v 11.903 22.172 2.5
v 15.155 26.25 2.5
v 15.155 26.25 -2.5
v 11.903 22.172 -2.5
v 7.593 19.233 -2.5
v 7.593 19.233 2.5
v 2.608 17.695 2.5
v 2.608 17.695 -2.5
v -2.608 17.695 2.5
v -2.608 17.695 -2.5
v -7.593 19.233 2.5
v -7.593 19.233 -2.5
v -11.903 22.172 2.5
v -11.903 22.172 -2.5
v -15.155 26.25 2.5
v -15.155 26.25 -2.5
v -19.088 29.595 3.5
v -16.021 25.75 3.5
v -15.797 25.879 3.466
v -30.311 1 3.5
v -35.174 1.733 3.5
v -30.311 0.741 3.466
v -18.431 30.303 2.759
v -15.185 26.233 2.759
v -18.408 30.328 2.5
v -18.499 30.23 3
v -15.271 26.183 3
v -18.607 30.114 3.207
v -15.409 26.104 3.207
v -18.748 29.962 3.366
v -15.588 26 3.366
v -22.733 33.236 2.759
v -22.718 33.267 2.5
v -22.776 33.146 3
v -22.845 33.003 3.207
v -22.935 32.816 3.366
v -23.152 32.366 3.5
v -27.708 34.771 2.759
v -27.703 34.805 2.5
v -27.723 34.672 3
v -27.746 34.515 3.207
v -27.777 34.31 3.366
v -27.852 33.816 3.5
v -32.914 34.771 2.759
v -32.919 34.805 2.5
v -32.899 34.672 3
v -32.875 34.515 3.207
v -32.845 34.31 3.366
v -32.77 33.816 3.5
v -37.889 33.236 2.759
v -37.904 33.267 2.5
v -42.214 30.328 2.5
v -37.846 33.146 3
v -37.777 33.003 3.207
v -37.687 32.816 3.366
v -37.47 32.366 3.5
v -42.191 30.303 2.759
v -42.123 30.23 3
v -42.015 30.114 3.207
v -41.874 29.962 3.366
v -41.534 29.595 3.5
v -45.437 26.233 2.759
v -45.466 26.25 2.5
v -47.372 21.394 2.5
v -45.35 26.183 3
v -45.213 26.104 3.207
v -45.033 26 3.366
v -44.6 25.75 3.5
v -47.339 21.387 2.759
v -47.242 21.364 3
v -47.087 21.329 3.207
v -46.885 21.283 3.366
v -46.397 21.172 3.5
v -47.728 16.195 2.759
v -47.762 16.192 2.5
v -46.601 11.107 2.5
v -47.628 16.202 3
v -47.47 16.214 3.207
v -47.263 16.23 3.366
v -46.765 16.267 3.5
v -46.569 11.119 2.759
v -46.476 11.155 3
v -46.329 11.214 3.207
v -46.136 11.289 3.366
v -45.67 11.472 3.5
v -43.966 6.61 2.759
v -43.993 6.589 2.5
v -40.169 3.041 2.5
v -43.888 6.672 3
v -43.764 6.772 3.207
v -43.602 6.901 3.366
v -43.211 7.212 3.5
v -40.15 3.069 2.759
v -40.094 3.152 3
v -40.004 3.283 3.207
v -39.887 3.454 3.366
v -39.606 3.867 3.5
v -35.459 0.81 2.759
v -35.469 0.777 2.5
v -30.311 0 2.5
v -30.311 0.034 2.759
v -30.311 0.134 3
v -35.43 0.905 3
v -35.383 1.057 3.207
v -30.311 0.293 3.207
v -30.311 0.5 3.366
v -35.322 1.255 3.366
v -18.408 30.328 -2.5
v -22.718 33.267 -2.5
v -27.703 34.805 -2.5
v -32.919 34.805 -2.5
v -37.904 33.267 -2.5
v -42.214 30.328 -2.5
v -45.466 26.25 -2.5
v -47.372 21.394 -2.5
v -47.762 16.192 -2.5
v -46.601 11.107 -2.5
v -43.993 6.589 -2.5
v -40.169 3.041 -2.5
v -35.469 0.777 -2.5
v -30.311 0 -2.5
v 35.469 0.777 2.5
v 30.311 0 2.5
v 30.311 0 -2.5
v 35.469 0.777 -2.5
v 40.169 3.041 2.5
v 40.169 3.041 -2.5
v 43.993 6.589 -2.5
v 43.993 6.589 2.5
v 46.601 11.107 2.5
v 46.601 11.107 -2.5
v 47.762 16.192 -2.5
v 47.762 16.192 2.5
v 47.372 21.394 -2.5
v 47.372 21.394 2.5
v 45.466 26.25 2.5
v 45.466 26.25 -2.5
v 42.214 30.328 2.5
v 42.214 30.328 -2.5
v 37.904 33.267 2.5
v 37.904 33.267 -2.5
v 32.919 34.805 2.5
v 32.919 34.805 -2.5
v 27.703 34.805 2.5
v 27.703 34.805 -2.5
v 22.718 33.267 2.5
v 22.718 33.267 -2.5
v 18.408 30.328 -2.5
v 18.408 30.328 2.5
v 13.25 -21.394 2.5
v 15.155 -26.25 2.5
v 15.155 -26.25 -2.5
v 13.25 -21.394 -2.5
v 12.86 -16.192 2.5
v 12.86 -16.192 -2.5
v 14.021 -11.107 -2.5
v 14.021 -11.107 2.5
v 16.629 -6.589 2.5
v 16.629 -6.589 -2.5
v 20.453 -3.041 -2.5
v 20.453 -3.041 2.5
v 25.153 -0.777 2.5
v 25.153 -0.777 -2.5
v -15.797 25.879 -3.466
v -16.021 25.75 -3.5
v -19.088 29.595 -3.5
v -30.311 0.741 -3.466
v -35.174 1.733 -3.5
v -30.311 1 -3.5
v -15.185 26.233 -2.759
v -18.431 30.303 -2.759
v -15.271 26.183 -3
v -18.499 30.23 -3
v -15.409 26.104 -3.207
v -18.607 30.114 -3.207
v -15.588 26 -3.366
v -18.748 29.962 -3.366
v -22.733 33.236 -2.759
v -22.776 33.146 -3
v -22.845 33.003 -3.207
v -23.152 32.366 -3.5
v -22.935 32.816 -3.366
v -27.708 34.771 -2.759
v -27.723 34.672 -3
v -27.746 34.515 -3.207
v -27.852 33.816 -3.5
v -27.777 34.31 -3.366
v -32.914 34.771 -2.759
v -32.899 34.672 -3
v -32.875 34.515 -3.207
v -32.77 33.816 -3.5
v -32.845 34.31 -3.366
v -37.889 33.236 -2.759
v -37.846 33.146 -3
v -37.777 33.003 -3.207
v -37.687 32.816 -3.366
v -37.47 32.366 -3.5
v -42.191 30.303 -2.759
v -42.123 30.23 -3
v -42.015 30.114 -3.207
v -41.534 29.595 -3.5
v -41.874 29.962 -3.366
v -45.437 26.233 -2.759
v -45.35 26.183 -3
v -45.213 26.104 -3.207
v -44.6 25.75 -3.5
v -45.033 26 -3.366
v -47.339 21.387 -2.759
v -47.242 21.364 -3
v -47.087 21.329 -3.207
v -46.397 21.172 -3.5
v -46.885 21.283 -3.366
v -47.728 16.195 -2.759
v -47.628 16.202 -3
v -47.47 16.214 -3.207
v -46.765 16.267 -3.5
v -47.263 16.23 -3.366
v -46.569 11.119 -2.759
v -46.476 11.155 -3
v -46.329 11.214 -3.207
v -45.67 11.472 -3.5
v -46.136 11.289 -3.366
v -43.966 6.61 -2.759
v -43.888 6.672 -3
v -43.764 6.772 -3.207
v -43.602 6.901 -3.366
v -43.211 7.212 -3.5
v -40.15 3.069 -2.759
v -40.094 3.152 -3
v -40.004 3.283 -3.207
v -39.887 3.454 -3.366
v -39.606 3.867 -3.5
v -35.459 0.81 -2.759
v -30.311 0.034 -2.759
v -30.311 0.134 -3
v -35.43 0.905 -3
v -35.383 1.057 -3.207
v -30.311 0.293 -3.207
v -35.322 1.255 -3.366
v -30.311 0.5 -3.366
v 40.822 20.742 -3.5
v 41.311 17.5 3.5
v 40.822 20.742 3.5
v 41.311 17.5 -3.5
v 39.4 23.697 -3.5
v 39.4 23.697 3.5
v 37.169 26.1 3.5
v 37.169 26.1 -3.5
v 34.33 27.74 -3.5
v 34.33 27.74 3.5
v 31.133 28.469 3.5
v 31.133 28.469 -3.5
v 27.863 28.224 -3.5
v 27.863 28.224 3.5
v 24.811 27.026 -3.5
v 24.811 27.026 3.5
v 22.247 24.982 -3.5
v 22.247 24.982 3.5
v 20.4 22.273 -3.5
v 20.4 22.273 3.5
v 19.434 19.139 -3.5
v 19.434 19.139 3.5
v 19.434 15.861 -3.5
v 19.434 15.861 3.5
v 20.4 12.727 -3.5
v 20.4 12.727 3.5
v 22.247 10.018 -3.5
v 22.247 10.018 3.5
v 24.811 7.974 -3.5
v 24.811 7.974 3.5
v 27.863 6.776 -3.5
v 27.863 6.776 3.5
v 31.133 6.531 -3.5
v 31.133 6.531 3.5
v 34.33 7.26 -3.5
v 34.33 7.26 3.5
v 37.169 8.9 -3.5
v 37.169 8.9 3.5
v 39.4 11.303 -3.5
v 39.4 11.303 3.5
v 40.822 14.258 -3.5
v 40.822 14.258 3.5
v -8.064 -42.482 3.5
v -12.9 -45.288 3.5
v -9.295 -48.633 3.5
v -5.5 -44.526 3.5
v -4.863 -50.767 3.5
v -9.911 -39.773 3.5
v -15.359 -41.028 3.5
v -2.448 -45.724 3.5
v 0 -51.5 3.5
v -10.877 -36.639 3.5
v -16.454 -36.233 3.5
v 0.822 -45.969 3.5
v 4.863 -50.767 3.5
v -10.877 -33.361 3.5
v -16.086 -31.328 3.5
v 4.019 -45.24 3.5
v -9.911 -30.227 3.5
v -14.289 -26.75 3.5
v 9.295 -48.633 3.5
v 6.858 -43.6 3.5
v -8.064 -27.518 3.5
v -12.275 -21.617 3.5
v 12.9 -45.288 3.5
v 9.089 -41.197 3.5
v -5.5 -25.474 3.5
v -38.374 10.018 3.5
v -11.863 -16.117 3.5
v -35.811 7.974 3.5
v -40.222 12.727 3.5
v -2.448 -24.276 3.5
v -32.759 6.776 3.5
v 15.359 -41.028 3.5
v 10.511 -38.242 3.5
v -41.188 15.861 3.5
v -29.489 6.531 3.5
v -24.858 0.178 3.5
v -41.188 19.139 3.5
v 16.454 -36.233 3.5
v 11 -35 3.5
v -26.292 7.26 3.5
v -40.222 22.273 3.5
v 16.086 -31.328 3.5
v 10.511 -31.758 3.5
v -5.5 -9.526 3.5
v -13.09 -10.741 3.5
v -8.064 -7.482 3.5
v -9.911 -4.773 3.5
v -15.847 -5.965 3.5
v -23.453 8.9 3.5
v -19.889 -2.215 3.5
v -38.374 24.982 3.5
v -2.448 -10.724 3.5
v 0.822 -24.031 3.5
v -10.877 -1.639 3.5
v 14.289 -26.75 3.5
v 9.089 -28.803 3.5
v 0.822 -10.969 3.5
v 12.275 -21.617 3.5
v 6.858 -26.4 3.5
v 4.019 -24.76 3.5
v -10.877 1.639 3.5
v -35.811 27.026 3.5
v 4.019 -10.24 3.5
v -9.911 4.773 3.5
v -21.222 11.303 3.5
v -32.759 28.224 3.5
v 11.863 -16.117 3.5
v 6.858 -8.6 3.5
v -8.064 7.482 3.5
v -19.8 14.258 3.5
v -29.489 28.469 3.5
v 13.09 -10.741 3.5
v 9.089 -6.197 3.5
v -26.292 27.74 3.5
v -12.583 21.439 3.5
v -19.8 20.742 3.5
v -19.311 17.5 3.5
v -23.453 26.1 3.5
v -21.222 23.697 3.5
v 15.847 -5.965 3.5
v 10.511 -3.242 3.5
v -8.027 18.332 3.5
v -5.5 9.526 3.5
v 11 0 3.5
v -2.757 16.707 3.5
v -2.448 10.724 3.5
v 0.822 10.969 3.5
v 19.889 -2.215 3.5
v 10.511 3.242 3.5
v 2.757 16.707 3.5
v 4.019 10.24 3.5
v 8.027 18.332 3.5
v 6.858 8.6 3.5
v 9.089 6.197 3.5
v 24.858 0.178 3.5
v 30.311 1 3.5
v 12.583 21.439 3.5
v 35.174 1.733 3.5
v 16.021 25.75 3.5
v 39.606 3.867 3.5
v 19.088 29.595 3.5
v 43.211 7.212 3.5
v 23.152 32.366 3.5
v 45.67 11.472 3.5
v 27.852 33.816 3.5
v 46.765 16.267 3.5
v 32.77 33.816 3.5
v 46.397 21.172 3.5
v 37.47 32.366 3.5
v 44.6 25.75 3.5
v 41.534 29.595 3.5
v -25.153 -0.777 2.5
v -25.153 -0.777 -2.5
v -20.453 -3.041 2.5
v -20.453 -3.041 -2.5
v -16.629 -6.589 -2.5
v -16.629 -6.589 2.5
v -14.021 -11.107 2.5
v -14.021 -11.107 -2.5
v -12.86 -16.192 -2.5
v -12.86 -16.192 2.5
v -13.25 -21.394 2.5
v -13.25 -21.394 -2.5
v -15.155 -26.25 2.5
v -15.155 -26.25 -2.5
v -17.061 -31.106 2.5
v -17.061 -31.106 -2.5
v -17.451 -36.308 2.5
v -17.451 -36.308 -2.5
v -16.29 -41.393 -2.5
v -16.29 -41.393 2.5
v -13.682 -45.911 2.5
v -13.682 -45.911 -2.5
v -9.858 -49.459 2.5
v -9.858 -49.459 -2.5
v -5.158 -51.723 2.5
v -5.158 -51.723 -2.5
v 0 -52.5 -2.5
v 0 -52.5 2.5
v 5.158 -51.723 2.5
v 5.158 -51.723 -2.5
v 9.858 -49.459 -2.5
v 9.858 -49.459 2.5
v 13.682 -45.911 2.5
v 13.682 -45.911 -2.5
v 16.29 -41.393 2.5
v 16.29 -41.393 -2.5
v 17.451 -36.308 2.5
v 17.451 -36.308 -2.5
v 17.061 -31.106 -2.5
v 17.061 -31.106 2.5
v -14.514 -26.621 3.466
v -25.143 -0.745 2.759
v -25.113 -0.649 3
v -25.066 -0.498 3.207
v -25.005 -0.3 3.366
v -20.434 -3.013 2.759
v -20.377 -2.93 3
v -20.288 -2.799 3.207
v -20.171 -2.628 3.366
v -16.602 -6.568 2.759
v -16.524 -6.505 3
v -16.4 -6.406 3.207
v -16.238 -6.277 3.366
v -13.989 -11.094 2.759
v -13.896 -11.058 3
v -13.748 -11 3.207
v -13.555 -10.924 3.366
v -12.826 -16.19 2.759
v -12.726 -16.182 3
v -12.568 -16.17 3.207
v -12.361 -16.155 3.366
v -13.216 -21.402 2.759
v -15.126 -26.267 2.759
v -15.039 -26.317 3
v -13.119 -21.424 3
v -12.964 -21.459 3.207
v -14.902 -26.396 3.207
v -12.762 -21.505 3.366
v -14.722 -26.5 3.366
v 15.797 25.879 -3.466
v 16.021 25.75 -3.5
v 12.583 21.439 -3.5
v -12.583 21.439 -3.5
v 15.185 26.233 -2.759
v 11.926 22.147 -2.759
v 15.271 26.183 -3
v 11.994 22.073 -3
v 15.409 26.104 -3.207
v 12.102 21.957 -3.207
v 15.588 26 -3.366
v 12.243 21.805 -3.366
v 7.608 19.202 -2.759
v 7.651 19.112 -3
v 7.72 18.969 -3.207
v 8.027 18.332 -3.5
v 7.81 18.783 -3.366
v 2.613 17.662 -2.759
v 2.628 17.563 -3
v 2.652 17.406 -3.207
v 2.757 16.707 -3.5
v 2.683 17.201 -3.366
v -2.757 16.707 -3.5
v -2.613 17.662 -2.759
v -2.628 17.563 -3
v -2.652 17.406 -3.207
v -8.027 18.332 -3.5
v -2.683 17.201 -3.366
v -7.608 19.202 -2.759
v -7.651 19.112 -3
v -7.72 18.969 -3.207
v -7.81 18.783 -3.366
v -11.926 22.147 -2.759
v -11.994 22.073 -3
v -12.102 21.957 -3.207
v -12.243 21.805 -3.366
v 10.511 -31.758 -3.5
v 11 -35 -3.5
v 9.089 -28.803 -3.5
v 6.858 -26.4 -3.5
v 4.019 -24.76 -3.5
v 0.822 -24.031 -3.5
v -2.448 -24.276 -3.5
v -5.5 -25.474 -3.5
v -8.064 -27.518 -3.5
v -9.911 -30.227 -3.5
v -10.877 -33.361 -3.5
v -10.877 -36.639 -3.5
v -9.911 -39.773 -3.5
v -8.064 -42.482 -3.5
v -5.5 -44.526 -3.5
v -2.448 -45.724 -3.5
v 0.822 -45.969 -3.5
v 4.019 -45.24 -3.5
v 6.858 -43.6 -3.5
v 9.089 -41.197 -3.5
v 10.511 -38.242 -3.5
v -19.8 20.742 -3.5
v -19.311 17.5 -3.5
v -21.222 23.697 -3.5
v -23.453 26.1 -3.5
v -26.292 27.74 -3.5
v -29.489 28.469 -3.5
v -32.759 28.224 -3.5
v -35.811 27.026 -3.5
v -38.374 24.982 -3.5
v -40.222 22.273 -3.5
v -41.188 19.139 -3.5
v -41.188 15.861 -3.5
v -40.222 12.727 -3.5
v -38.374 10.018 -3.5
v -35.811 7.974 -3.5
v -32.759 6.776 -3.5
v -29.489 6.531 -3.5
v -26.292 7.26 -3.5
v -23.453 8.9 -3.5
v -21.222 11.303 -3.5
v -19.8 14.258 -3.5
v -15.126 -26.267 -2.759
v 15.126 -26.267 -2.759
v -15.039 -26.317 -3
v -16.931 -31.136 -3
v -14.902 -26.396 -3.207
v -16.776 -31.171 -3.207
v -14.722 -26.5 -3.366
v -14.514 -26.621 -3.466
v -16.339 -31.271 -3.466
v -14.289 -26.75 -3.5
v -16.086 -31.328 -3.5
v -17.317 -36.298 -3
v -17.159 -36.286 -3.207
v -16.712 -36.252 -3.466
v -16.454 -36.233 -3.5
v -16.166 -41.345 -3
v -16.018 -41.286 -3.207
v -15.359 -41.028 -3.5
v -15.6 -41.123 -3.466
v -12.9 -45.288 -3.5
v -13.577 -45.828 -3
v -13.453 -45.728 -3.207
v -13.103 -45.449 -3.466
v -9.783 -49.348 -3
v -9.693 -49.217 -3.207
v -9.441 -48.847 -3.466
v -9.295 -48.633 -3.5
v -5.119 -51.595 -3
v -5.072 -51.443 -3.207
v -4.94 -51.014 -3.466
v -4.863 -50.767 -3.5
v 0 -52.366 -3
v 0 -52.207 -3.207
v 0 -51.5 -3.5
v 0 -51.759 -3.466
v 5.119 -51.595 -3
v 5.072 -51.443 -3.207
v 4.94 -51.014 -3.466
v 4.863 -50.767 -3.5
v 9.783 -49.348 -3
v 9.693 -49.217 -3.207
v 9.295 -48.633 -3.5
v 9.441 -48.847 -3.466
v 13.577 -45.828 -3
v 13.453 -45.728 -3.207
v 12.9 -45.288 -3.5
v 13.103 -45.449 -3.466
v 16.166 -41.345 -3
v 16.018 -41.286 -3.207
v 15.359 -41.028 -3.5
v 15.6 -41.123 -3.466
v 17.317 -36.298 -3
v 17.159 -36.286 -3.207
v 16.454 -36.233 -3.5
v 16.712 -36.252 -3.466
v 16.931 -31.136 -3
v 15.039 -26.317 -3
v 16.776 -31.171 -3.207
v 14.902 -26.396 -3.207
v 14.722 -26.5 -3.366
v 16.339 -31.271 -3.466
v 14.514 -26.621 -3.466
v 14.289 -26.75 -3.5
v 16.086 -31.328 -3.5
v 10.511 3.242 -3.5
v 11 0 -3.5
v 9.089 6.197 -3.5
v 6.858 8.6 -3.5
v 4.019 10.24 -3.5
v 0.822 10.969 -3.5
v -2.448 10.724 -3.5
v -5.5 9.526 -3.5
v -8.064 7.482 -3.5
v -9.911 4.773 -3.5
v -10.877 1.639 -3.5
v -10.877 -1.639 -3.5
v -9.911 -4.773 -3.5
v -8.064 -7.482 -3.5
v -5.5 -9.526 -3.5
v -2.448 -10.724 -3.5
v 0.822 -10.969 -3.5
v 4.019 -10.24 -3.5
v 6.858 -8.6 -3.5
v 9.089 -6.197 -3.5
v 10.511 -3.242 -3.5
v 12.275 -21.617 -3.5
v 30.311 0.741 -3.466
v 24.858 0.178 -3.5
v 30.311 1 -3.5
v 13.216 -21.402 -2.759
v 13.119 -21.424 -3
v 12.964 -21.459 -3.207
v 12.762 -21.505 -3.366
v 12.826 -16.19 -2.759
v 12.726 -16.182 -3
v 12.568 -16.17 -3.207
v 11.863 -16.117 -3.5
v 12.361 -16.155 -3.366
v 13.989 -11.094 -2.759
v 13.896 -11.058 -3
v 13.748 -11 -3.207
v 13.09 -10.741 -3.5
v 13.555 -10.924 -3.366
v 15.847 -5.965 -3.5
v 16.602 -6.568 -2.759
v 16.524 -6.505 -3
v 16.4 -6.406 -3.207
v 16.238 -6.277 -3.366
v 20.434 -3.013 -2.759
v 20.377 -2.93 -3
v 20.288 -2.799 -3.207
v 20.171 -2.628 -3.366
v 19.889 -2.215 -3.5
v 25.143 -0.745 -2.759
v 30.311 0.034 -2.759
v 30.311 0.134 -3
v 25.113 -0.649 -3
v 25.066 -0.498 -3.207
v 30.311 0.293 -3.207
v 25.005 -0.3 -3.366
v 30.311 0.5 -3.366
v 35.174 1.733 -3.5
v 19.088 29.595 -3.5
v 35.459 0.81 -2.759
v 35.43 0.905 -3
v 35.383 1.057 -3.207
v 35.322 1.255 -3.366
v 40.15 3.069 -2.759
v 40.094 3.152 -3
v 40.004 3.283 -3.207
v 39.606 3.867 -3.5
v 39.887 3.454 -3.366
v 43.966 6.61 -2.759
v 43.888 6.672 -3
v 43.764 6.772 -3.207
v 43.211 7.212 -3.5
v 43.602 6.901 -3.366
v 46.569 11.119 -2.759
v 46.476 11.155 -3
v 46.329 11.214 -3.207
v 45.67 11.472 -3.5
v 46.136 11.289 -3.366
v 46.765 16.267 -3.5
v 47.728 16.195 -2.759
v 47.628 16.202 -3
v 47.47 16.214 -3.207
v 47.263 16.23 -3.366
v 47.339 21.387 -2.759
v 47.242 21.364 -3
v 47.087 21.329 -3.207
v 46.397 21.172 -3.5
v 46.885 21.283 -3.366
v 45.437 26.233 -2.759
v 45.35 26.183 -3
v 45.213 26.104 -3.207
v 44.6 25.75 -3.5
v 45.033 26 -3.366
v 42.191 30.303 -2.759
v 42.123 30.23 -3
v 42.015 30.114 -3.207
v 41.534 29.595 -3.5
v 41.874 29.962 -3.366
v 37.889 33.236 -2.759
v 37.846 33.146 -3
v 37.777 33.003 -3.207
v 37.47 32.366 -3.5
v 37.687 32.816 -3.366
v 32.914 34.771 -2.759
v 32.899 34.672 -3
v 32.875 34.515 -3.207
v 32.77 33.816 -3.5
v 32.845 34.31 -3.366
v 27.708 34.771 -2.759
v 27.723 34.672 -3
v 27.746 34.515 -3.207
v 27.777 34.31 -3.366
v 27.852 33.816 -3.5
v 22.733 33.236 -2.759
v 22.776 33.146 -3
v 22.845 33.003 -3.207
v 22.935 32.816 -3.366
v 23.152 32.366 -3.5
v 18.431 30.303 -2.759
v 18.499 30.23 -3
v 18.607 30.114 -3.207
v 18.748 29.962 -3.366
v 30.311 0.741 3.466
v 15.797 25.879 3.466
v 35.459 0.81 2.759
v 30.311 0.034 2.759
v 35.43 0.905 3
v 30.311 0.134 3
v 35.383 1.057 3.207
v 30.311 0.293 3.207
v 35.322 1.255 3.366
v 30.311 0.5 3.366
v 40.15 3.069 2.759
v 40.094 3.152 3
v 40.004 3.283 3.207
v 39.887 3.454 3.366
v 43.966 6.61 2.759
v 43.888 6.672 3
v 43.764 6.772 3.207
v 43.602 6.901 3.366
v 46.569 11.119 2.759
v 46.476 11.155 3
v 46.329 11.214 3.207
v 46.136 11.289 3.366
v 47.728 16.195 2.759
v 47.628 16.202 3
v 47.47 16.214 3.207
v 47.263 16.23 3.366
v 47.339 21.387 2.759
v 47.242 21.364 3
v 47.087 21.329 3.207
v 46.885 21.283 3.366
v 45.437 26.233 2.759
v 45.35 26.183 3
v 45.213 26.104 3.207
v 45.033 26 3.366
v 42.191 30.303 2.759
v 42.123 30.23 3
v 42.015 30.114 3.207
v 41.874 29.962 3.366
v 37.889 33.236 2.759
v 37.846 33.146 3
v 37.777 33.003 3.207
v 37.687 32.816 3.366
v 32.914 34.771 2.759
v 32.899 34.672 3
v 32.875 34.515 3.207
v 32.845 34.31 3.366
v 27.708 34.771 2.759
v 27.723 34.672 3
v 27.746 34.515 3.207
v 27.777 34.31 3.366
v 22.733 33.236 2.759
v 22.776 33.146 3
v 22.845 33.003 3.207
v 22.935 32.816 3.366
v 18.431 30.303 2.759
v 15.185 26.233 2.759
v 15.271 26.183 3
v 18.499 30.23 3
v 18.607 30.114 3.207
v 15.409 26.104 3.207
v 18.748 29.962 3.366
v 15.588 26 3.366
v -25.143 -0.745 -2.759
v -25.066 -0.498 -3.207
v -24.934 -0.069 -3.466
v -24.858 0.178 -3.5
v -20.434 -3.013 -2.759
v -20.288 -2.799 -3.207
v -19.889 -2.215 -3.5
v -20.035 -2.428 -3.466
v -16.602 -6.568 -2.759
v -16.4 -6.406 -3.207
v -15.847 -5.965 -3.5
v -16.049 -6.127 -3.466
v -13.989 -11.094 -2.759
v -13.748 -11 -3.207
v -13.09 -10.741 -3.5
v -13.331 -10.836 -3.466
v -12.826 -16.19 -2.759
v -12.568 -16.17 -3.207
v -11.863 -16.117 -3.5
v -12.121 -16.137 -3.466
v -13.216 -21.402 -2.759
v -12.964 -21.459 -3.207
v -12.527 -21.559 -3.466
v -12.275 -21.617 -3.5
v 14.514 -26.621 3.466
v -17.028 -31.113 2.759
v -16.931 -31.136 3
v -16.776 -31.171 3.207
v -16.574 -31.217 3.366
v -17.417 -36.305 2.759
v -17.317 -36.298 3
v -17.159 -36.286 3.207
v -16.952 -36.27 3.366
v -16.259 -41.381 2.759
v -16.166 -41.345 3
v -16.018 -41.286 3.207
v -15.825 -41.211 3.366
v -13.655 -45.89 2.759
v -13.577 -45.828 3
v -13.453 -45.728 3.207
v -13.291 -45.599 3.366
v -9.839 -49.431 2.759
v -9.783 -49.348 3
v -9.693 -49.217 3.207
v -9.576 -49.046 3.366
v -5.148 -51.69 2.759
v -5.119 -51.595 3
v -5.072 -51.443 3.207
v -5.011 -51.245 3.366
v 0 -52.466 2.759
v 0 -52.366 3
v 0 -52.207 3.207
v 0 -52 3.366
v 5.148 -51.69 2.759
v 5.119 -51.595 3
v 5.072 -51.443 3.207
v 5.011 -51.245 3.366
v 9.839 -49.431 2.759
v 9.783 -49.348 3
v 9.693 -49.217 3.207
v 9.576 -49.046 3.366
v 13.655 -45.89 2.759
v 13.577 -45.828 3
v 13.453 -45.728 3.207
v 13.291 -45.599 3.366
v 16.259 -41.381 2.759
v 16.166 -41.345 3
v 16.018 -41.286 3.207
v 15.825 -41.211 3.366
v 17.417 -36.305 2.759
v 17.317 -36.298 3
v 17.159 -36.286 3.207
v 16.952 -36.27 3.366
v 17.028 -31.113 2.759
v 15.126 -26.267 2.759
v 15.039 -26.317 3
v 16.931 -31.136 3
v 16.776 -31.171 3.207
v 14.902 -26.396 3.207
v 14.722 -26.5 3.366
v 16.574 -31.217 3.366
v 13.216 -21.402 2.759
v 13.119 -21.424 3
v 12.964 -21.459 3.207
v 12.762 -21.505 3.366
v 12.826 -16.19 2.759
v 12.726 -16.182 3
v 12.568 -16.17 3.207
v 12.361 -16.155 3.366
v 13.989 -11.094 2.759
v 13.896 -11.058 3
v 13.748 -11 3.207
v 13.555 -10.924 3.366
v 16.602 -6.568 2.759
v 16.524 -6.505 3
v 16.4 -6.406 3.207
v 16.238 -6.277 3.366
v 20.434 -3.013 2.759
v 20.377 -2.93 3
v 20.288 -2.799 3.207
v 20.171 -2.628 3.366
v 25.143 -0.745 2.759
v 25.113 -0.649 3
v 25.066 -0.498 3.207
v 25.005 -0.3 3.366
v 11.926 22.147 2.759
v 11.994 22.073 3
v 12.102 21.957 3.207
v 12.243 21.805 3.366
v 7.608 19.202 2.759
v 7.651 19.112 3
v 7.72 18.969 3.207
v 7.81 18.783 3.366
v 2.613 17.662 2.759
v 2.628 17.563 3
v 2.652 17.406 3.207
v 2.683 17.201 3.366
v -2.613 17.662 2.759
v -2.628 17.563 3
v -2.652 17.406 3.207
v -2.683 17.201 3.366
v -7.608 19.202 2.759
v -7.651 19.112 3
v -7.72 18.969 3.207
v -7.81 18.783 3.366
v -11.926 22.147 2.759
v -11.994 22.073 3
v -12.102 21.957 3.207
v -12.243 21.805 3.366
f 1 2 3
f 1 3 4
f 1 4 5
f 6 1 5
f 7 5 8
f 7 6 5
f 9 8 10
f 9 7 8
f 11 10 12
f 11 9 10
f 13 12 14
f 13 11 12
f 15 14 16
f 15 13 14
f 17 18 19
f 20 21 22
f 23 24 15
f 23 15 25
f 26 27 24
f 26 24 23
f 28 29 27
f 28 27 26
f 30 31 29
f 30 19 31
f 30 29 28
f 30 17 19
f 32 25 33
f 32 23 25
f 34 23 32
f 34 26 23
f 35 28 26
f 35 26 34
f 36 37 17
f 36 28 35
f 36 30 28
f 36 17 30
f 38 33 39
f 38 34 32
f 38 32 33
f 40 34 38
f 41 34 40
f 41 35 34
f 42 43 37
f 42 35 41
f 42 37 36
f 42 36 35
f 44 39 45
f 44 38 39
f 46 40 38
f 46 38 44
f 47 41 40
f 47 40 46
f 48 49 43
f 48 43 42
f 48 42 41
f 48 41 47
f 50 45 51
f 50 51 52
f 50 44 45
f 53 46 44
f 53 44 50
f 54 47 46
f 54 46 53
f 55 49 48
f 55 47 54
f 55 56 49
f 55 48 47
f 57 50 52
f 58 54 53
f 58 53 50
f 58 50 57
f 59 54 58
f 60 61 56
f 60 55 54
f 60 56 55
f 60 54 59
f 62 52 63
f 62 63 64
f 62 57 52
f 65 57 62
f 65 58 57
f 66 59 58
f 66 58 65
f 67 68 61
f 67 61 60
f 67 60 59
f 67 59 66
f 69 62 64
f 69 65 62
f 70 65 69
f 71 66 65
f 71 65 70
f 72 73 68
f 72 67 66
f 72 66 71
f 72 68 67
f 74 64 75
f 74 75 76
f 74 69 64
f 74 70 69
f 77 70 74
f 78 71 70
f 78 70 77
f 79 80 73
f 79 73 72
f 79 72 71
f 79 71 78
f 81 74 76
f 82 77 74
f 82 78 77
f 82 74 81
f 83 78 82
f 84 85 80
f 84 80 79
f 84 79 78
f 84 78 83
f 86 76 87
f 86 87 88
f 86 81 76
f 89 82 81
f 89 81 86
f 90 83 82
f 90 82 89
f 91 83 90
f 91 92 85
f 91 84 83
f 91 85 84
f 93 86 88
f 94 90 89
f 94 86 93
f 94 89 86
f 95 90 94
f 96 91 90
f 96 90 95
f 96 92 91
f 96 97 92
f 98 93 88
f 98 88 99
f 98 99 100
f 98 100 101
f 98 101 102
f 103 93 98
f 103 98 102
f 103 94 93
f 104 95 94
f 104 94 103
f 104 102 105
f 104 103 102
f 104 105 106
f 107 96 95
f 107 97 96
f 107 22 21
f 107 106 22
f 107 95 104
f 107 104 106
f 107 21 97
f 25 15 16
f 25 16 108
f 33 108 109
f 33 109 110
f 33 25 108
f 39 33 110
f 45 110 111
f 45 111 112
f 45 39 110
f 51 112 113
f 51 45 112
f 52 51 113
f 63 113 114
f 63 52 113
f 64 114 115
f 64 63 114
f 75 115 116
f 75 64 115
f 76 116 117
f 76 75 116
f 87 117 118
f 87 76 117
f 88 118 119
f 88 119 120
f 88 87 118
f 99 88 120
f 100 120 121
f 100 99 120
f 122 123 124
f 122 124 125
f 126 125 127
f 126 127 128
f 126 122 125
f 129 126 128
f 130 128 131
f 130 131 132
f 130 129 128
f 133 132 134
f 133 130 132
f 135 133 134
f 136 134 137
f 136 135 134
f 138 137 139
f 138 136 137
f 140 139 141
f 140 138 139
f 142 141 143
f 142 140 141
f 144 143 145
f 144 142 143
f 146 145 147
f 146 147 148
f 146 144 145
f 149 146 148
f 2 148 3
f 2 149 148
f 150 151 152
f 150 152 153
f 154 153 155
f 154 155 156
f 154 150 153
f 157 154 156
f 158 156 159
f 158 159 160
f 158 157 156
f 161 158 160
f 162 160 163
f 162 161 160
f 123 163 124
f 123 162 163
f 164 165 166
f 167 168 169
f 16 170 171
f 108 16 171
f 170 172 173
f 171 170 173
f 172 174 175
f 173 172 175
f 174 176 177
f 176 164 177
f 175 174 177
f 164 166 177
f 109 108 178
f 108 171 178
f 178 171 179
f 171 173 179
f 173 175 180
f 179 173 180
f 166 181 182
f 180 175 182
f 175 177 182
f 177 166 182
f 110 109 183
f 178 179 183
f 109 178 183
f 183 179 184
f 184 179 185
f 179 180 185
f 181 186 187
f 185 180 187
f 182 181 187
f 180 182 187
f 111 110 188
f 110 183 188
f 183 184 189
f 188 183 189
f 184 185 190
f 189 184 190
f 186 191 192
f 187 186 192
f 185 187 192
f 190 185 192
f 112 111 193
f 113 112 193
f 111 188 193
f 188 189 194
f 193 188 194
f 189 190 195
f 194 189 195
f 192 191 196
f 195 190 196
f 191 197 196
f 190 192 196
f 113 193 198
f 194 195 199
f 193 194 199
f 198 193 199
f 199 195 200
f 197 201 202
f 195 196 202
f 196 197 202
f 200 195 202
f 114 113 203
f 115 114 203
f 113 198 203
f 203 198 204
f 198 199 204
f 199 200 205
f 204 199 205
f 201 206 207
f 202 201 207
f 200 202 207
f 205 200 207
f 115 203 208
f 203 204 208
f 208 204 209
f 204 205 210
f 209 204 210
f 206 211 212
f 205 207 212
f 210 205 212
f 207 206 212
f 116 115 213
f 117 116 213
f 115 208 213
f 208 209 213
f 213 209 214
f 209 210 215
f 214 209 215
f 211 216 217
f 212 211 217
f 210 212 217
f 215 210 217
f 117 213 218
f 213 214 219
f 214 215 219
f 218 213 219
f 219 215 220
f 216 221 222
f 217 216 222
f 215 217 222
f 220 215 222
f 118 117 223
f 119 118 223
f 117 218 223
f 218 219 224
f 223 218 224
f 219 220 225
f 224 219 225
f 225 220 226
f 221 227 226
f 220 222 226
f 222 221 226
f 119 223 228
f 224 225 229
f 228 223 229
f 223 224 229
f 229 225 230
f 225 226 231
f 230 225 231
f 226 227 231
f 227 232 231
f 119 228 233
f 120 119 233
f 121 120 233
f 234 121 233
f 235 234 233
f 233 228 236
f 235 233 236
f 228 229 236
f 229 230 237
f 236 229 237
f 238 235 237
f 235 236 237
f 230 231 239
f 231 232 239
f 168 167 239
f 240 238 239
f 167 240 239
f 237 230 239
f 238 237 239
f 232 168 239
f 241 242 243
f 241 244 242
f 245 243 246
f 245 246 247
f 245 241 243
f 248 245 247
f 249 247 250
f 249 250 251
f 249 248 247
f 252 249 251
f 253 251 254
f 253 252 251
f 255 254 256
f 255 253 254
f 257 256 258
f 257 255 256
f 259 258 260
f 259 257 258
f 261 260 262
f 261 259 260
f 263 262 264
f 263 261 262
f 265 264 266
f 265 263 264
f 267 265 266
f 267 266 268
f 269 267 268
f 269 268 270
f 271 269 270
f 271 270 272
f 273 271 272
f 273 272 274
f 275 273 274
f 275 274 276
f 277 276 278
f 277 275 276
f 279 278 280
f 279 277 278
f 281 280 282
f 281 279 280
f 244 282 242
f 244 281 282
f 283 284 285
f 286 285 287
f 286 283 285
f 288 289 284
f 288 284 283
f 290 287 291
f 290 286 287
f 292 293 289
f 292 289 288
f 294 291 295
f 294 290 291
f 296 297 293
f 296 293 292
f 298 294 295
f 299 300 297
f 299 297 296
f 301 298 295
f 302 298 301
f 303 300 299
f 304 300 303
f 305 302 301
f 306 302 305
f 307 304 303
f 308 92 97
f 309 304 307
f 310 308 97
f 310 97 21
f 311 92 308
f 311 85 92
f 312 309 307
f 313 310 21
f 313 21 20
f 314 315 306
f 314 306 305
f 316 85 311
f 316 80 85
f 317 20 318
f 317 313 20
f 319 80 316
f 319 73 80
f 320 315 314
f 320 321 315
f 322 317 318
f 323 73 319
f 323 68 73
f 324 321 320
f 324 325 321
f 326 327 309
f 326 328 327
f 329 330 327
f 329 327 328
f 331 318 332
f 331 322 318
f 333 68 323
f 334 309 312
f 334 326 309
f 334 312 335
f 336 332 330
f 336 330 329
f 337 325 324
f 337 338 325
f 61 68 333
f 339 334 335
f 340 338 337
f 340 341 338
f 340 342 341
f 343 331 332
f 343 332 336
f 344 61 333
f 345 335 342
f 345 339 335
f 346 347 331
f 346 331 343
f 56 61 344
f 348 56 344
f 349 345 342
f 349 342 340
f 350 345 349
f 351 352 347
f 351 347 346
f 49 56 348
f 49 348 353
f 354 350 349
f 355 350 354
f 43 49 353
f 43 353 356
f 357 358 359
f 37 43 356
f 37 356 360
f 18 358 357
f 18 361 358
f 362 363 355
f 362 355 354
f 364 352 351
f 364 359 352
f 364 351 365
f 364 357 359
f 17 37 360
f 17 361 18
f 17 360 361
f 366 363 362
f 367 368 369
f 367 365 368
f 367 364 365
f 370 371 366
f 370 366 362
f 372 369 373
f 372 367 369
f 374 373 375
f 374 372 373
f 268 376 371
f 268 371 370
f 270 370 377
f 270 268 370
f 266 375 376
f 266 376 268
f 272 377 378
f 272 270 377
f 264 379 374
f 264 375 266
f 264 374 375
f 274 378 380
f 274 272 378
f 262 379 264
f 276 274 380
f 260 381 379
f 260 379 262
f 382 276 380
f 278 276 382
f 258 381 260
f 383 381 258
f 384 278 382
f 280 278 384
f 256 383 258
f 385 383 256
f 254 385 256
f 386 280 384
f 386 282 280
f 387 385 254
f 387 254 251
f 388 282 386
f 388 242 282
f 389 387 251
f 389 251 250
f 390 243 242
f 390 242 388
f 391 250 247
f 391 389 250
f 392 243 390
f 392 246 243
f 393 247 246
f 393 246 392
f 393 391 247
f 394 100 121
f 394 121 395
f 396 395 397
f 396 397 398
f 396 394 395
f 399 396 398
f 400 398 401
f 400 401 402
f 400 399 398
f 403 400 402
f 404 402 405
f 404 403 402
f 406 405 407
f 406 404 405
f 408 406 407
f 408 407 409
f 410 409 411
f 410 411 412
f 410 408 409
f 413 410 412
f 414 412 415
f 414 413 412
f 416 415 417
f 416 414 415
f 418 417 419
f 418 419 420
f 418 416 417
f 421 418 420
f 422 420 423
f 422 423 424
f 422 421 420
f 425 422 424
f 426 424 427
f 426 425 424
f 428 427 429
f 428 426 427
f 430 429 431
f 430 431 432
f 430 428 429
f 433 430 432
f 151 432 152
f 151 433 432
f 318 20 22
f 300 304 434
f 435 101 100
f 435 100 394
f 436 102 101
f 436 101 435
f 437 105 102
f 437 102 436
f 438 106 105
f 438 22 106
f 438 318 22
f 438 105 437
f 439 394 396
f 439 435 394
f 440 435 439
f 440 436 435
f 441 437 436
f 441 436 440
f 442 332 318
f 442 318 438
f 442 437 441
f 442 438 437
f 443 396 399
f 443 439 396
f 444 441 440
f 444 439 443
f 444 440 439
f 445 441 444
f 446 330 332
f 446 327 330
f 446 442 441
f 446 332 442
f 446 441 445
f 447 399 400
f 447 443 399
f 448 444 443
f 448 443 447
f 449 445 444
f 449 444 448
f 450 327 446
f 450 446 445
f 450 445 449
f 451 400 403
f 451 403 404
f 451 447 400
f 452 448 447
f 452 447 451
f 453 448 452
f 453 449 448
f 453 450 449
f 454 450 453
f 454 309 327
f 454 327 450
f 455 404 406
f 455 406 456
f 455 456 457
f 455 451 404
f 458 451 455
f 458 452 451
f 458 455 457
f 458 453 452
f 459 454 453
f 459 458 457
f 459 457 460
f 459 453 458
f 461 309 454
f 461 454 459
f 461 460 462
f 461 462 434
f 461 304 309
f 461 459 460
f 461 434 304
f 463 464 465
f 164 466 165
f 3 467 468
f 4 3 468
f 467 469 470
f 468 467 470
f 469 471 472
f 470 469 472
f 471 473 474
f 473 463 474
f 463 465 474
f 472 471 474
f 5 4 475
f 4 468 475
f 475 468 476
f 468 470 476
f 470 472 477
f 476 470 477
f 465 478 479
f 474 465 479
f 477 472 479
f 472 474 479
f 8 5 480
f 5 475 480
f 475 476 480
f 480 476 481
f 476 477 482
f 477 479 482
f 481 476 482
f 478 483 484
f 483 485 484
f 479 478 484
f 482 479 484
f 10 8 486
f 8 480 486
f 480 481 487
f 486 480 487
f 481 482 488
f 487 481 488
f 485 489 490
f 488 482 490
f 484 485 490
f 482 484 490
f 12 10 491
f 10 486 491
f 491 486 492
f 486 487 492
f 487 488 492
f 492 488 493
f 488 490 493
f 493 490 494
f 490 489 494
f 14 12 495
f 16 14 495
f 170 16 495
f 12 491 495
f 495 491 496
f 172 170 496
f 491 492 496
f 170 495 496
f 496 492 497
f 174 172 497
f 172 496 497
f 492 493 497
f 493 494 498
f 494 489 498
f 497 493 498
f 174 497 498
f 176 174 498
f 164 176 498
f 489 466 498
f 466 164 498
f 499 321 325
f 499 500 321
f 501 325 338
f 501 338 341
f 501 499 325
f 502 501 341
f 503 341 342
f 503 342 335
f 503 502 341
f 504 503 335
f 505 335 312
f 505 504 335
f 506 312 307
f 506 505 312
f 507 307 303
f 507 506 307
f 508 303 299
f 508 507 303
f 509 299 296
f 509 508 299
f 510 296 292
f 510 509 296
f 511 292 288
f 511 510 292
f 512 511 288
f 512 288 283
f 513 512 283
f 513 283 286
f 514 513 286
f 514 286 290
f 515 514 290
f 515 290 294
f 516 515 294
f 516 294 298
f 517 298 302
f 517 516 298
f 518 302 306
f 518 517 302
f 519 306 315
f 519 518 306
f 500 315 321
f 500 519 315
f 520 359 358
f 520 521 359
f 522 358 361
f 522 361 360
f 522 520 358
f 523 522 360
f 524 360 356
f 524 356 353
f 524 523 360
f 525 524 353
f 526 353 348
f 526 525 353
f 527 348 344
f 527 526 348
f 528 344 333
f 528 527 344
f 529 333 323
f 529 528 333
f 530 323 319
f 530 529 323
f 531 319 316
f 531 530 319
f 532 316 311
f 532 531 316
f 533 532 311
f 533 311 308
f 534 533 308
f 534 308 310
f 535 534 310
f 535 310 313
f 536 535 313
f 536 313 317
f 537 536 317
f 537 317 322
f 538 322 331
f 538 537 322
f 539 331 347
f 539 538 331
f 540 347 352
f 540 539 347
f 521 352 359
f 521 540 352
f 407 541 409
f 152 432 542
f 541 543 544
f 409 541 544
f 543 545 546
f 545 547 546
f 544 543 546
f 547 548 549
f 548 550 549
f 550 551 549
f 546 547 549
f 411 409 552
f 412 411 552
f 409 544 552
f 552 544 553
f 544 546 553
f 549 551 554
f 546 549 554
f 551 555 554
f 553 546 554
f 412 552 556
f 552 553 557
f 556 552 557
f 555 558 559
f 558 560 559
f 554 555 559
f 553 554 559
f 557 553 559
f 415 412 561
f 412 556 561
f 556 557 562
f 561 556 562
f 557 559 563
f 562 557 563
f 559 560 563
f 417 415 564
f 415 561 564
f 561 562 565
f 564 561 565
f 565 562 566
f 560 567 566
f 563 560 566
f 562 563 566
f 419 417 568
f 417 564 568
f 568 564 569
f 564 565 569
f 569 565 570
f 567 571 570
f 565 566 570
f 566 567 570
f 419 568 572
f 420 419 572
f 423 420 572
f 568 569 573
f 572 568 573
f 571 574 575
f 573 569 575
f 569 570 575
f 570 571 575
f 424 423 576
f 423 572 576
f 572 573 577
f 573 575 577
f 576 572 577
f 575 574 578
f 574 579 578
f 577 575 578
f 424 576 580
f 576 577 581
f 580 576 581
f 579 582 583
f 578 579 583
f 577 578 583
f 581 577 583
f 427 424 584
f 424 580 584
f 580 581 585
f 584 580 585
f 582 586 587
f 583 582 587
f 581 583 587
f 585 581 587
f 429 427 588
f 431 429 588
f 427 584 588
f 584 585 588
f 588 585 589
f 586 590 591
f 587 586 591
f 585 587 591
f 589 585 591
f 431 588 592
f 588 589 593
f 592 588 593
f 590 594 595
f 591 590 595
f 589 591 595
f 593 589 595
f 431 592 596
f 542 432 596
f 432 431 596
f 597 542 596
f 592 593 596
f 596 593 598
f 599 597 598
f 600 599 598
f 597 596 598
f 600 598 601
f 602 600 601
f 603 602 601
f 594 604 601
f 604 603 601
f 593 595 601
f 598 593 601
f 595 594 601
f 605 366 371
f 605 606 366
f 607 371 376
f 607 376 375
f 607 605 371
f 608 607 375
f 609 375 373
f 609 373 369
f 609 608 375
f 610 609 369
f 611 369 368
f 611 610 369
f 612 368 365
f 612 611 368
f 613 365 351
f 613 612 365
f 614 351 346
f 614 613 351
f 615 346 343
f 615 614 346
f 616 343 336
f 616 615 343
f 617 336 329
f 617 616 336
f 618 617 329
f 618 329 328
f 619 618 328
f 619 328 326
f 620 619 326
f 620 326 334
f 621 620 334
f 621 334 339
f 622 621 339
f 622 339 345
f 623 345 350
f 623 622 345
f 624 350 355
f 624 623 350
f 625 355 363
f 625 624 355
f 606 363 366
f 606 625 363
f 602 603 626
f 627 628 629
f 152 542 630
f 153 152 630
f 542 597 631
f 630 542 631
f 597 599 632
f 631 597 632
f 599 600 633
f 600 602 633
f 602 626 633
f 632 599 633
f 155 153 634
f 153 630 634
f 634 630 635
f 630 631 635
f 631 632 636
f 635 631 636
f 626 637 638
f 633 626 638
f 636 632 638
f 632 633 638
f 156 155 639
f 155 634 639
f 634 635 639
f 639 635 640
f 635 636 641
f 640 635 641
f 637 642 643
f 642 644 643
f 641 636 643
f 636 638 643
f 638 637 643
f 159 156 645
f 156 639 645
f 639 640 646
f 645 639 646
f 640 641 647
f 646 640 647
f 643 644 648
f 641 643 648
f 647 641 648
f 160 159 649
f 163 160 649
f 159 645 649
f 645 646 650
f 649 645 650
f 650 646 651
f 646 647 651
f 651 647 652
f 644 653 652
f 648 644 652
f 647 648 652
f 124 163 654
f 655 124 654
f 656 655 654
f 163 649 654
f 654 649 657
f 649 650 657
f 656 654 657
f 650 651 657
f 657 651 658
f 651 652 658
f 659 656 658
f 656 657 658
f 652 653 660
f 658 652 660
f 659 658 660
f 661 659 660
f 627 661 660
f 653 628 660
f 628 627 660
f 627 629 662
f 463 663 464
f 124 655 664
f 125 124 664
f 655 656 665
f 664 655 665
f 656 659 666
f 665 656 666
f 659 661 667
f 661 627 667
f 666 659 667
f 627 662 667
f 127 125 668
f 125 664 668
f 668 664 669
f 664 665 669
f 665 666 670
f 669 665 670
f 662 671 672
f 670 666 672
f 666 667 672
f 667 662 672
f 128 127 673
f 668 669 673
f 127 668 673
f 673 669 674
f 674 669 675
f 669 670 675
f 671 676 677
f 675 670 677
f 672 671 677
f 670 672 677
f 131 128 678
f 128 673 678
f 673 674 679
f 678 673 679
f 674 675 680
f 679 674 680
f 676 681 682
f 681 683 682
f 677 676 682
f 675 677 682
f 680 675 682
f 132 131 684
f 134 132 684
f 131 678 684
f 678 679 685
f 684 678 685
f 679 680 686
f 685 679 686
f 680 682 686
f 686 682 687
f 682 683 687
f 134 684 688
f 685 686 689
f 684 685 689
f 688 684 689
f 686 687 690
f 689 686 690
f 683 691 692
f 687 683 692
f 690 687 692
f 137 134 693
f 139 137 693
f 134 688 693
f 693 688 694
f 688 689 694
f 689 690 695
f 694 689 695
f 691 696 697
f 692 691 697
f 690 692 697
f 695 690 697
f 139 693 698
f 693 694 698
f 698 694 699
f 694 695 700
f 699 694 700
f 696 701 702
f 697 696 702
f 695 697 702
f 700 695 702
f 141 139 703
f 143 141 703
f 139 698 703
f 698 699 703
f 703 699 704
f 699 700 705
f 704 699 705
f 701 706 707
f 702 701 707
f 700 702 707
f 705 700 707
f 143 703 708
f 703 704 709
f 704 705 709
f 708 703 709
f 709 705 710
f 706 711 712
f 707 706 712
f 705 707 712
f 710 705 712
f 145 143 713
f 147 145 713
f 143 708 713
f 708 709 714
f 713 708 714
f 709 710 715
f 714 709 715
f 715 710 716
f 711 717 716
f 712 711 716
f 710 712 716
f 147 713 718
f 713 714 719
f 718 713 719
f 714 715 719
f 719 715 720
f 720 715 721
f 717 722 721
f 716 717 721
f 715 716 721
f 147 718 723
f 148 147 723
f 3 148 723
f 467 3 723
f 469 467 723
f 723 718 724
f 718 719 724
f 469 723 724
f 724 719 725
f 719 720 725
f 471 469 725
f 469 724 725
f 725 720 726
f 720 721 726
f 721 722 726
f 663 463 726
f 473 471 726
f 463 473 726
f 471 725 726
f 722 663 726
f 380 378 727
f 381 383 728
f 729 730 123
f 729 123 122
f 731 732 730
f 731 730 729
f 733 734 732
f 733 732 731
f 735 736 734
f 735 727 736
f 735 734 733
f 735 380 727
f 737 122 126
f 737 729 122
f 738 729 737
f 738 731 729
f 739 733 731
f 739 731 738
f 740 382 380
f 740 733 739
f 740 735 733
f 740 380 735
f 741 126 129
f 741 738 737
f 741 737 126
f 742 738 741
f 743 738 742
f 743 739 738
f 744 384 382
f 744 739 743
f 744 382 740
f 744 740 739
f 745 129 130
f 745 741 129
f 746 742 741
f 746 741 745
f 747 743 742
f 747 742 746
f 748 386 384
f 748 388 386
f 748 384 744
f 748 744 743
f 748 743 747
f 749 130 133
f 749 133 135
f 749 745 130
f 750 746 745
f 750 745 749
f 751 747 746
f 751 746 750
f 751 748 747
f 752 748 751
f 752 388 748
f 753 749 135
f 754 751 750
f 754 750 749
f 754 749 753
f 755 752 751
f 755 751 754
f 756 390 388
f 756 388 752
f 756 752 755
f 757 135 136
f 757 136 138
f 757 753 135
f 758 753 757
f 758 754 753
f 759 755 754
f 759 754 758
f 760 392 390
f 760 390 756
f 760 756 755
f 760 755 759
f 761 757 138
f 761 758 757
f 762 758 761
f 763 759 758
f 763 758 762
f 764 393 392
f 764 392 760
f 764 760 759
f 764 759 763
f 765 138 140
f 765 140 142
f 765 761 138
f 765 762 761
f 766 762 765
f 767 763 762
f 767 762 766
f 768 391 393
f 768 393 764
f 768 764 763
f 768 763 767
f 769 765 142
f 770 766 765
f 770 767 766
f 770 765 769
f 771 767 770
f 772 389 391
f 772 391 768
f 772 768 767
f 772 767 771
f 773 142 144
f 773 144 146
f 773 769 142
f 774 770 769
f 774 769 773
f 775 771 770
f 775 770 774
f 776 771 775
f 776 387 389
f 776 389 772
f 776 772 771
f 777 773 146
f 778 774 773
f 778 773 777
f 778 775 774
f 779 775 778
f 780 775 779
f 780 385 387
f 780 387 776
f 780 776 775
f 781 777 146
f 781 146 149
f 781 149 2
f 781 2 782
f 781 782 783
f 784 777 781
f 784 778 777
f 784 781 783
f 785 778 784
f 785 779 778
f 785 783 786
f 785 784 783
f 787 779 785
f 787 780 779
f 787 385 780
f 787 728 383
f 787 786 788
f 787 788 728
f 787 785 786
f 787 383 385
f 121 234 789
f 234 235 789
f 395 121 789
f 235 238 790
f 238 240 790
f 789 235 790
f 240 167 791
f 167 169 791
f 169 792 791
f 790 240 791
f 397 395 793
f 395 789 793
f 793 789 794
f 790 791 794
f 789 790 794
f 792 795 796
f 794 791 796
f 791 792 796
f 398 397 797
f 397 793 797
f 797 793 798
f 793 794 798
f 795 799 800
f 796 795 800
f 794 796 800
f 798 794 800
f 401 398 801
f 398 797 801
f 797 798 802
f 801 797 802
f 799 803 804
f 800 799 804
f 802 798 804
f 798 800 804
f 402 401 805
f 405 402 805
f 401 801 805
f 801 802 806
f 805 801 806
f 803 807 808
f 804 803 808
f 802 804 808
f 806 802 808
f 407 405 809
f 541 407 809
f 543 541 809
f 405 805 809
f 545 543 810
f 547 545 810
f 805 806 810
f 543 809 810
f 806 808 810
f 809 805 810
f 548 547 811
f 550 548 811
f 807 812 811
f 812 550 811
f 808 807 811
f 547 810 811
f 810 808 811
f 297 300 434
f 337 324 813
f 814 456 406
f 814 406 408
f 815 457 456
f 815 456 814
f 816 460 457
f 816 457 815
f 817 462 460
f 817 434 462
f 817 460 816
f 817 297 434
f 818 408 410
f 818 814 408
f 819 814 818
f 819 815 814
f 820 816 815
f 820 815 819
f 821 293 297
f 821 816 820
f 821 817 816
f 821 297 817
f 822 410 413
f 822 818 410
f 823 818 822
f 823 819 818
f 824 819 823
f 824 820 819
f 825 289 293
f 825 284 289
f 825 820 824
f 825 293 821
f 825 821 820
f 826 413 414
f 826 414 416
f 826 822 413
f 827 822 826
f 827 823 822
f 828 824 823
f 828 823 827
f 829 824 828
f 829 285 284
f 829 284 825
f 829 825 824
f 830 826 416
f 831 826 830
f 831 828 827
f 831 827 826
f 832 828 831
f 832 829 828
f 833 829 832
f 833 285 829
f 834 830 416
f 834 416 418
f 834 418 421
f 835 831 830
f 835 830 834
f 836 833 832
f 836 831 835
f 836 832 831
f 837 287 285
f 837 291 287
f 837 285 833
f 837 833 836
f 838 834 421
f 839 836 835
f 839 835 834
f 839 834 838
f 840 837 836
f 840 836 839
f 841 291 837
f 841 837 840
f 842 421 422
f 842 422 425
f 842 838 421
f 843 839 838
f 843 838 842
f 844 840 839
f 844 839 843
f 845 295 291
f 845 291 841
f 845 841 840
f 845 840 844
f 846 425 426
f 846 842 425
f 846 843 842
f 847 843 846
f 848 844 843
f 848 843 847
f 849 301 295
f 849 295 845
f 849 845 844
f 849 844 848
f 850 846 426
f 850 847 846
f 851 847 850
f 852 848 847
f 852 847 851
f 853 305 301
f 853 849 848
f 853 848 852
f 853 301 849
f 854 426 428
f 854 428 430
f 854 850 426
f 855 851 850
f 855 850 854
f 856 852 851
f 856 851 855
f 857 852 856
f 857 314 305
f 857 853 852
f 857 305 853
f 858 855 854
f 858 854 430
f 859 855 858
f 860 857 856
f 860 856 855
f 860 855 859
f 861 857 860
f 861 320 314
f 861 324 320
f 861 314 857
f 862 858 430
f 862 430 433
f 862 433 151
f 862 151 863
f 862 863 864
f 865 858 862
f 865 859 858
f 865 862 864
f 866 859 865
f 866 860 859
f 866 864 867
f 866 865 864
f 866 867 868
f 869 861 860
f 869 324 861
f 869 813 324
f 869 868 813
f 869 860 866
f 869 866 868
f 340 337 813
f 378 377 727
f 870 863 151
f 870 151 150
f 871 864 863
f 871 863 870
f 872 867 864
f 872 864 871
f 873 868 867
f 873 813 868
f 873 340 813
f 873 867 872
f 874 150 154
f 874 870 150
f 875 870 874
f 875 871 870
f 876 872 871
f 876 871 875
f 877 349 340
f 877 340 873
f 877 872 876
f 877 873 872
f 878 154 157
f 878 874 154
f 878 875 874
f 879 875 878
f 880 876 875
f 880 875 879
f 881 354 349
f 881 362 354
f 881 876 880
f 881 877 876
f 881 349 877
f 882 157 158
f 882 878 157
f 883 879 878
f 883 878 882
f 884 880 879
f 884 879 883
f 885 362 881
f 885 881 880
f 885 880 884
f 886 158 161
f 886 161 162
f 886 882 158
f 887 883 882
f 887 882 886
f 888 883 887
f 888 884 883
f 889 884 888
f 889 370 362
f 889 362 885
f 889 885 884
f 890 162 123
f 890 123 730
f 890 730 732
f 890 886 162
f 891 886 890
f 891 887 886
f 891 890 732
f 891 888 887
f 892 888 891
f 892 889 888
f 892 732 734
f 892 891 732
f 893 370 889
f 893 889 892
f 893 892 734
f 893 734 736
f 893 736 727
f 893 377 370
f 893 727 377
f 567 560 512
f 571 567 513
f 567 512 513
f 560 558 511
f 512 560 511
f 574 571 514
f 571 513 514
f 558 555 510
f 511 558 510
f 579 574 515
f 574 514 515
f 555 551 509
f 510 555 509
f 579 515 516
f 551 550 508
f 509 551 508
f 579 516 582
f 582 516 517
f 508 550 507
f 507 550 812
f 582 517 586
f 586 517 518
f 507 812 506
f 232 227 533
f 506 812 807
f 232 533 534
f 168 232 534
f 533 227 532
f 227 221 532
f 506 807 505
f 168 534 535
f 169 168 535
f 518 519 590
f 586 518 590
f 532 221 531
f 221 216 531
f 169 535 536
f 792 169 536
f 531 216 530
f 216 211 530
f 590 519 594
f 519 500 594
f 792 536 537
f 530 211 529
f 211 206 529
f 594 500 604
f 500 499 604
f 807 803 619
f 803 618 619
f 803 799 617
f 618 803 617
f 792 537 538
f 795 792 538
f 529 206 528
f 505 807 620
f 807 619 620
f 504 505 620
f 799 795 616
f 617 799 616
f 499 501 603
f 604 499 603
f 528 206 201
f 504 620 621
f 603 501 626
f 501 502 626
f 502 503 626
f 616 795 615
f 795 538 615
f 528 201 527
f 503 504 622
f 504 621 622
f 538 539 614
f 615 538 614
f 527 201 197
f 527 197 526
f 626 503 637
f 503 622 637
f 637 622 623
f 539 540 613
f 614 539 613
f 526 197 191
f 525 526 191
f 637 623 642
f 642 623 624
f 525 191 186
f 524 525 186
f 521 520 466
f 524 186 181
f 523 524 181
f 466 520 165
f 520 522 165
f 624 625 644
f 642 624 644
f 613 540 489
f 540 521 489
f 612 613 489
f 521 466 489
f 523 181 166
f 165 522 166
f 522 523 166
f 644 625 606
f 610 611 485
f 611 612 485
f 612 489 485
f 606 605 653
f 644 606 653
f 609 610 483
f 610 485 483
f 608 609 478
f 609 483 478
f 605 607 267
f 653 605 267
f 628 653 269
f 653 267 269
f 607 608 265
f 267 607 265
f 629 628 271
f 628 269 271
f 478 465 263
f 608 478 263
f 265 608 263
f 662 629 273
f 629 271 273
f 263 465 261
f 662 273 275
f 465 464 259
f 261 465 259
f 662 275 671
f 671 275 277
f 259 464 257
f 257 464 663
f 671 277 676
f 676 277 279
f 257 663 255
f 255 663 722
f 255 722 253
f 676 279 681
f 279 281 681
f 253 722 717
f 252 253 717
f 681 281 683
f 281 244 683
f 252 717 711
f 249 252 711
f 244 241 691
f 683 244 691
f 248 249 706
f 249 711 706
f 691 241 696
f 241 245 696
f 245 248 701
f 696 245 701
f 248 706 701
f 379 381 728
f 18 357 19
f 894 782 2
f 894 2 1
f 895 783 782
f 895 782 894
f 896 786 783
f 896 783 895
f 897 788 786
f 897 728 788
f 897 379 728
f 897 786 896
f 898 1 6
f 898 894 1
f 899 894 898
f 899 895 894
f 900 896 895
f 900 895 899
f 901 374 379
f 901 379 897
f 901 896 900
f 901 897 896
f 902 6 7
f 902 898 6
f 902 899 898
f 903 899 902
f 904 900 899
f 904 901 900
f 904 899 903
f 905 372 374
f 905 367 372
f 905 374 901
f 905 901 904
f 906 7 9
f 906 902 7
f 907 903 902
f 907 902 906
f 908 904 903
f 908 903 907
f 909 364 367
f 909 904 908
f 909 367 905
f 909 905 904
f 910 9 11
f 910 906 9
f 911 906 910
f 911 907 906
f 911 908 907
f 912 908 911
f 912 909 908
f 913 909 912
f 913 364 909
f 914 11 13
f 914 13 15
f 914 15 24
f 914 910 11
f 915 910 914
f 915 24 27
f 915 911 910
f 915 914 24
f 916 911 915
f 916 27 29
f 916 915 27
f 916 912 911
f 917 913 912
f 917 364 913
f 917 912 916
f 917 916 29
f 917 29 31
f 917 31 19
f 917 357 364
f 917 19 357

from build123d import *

# Parameters (mm, degrees)
F1_R     = 11
F2_DEPTH = 3.5
F3_R     = 1


with BuildPart() as f2:
    # F1 (on Top) → F2 (new body, symmetric)
    with BuildSketch(Plane.XY):
        with BuildLine():
            ThreePointArc((-30.310889, 0), (-15.155445, -8.75), (-15.155445, -26.25))
            ThreePointArc((-15.155445, -26.25), (0, -52.5), (15.155445, -26.25))
            ThreePointArc((15.155445, -26.25), (15.155445, -8.75), (30.310889, 0))
            ThreePointArc((30.310889, 0), (45.466334, 26.25), (15.155445, 26.25))
            ThreePointArc((15.155445, 26.25), (0, 17.5), (-15.155445, 26.25))
            ThreePointArc((-15.155445, 26.25), (-45.466334, 26.25), (-30.310889, 0))
        make_face()
        with Locations((0, -35)):
            Circle(F1_R, mode=Mode.SUBTRACT)
        Circle(F1_R, mode=Mode.SUBTRACT)
        with Locations((-30.310889, 17.5)):
            Circle(F1_R, mode=Mode.SUBTRACT)
        with Locations((30.310889, 17.5)):
            Circle(F1_R, mode=Mode.SUBTRACT)
    extrude(amount=F2_DEPTH, both=True)

    # F3
    f3_edges = [f2.edges().sort_by_distance(p)[0] for p in [
        (-15.155445, -8.75, 3.5),
        (0, -52.5, -3.5),
    ]]
    fillet(f3_edges, radius=F3_R)


solid = f2.part
